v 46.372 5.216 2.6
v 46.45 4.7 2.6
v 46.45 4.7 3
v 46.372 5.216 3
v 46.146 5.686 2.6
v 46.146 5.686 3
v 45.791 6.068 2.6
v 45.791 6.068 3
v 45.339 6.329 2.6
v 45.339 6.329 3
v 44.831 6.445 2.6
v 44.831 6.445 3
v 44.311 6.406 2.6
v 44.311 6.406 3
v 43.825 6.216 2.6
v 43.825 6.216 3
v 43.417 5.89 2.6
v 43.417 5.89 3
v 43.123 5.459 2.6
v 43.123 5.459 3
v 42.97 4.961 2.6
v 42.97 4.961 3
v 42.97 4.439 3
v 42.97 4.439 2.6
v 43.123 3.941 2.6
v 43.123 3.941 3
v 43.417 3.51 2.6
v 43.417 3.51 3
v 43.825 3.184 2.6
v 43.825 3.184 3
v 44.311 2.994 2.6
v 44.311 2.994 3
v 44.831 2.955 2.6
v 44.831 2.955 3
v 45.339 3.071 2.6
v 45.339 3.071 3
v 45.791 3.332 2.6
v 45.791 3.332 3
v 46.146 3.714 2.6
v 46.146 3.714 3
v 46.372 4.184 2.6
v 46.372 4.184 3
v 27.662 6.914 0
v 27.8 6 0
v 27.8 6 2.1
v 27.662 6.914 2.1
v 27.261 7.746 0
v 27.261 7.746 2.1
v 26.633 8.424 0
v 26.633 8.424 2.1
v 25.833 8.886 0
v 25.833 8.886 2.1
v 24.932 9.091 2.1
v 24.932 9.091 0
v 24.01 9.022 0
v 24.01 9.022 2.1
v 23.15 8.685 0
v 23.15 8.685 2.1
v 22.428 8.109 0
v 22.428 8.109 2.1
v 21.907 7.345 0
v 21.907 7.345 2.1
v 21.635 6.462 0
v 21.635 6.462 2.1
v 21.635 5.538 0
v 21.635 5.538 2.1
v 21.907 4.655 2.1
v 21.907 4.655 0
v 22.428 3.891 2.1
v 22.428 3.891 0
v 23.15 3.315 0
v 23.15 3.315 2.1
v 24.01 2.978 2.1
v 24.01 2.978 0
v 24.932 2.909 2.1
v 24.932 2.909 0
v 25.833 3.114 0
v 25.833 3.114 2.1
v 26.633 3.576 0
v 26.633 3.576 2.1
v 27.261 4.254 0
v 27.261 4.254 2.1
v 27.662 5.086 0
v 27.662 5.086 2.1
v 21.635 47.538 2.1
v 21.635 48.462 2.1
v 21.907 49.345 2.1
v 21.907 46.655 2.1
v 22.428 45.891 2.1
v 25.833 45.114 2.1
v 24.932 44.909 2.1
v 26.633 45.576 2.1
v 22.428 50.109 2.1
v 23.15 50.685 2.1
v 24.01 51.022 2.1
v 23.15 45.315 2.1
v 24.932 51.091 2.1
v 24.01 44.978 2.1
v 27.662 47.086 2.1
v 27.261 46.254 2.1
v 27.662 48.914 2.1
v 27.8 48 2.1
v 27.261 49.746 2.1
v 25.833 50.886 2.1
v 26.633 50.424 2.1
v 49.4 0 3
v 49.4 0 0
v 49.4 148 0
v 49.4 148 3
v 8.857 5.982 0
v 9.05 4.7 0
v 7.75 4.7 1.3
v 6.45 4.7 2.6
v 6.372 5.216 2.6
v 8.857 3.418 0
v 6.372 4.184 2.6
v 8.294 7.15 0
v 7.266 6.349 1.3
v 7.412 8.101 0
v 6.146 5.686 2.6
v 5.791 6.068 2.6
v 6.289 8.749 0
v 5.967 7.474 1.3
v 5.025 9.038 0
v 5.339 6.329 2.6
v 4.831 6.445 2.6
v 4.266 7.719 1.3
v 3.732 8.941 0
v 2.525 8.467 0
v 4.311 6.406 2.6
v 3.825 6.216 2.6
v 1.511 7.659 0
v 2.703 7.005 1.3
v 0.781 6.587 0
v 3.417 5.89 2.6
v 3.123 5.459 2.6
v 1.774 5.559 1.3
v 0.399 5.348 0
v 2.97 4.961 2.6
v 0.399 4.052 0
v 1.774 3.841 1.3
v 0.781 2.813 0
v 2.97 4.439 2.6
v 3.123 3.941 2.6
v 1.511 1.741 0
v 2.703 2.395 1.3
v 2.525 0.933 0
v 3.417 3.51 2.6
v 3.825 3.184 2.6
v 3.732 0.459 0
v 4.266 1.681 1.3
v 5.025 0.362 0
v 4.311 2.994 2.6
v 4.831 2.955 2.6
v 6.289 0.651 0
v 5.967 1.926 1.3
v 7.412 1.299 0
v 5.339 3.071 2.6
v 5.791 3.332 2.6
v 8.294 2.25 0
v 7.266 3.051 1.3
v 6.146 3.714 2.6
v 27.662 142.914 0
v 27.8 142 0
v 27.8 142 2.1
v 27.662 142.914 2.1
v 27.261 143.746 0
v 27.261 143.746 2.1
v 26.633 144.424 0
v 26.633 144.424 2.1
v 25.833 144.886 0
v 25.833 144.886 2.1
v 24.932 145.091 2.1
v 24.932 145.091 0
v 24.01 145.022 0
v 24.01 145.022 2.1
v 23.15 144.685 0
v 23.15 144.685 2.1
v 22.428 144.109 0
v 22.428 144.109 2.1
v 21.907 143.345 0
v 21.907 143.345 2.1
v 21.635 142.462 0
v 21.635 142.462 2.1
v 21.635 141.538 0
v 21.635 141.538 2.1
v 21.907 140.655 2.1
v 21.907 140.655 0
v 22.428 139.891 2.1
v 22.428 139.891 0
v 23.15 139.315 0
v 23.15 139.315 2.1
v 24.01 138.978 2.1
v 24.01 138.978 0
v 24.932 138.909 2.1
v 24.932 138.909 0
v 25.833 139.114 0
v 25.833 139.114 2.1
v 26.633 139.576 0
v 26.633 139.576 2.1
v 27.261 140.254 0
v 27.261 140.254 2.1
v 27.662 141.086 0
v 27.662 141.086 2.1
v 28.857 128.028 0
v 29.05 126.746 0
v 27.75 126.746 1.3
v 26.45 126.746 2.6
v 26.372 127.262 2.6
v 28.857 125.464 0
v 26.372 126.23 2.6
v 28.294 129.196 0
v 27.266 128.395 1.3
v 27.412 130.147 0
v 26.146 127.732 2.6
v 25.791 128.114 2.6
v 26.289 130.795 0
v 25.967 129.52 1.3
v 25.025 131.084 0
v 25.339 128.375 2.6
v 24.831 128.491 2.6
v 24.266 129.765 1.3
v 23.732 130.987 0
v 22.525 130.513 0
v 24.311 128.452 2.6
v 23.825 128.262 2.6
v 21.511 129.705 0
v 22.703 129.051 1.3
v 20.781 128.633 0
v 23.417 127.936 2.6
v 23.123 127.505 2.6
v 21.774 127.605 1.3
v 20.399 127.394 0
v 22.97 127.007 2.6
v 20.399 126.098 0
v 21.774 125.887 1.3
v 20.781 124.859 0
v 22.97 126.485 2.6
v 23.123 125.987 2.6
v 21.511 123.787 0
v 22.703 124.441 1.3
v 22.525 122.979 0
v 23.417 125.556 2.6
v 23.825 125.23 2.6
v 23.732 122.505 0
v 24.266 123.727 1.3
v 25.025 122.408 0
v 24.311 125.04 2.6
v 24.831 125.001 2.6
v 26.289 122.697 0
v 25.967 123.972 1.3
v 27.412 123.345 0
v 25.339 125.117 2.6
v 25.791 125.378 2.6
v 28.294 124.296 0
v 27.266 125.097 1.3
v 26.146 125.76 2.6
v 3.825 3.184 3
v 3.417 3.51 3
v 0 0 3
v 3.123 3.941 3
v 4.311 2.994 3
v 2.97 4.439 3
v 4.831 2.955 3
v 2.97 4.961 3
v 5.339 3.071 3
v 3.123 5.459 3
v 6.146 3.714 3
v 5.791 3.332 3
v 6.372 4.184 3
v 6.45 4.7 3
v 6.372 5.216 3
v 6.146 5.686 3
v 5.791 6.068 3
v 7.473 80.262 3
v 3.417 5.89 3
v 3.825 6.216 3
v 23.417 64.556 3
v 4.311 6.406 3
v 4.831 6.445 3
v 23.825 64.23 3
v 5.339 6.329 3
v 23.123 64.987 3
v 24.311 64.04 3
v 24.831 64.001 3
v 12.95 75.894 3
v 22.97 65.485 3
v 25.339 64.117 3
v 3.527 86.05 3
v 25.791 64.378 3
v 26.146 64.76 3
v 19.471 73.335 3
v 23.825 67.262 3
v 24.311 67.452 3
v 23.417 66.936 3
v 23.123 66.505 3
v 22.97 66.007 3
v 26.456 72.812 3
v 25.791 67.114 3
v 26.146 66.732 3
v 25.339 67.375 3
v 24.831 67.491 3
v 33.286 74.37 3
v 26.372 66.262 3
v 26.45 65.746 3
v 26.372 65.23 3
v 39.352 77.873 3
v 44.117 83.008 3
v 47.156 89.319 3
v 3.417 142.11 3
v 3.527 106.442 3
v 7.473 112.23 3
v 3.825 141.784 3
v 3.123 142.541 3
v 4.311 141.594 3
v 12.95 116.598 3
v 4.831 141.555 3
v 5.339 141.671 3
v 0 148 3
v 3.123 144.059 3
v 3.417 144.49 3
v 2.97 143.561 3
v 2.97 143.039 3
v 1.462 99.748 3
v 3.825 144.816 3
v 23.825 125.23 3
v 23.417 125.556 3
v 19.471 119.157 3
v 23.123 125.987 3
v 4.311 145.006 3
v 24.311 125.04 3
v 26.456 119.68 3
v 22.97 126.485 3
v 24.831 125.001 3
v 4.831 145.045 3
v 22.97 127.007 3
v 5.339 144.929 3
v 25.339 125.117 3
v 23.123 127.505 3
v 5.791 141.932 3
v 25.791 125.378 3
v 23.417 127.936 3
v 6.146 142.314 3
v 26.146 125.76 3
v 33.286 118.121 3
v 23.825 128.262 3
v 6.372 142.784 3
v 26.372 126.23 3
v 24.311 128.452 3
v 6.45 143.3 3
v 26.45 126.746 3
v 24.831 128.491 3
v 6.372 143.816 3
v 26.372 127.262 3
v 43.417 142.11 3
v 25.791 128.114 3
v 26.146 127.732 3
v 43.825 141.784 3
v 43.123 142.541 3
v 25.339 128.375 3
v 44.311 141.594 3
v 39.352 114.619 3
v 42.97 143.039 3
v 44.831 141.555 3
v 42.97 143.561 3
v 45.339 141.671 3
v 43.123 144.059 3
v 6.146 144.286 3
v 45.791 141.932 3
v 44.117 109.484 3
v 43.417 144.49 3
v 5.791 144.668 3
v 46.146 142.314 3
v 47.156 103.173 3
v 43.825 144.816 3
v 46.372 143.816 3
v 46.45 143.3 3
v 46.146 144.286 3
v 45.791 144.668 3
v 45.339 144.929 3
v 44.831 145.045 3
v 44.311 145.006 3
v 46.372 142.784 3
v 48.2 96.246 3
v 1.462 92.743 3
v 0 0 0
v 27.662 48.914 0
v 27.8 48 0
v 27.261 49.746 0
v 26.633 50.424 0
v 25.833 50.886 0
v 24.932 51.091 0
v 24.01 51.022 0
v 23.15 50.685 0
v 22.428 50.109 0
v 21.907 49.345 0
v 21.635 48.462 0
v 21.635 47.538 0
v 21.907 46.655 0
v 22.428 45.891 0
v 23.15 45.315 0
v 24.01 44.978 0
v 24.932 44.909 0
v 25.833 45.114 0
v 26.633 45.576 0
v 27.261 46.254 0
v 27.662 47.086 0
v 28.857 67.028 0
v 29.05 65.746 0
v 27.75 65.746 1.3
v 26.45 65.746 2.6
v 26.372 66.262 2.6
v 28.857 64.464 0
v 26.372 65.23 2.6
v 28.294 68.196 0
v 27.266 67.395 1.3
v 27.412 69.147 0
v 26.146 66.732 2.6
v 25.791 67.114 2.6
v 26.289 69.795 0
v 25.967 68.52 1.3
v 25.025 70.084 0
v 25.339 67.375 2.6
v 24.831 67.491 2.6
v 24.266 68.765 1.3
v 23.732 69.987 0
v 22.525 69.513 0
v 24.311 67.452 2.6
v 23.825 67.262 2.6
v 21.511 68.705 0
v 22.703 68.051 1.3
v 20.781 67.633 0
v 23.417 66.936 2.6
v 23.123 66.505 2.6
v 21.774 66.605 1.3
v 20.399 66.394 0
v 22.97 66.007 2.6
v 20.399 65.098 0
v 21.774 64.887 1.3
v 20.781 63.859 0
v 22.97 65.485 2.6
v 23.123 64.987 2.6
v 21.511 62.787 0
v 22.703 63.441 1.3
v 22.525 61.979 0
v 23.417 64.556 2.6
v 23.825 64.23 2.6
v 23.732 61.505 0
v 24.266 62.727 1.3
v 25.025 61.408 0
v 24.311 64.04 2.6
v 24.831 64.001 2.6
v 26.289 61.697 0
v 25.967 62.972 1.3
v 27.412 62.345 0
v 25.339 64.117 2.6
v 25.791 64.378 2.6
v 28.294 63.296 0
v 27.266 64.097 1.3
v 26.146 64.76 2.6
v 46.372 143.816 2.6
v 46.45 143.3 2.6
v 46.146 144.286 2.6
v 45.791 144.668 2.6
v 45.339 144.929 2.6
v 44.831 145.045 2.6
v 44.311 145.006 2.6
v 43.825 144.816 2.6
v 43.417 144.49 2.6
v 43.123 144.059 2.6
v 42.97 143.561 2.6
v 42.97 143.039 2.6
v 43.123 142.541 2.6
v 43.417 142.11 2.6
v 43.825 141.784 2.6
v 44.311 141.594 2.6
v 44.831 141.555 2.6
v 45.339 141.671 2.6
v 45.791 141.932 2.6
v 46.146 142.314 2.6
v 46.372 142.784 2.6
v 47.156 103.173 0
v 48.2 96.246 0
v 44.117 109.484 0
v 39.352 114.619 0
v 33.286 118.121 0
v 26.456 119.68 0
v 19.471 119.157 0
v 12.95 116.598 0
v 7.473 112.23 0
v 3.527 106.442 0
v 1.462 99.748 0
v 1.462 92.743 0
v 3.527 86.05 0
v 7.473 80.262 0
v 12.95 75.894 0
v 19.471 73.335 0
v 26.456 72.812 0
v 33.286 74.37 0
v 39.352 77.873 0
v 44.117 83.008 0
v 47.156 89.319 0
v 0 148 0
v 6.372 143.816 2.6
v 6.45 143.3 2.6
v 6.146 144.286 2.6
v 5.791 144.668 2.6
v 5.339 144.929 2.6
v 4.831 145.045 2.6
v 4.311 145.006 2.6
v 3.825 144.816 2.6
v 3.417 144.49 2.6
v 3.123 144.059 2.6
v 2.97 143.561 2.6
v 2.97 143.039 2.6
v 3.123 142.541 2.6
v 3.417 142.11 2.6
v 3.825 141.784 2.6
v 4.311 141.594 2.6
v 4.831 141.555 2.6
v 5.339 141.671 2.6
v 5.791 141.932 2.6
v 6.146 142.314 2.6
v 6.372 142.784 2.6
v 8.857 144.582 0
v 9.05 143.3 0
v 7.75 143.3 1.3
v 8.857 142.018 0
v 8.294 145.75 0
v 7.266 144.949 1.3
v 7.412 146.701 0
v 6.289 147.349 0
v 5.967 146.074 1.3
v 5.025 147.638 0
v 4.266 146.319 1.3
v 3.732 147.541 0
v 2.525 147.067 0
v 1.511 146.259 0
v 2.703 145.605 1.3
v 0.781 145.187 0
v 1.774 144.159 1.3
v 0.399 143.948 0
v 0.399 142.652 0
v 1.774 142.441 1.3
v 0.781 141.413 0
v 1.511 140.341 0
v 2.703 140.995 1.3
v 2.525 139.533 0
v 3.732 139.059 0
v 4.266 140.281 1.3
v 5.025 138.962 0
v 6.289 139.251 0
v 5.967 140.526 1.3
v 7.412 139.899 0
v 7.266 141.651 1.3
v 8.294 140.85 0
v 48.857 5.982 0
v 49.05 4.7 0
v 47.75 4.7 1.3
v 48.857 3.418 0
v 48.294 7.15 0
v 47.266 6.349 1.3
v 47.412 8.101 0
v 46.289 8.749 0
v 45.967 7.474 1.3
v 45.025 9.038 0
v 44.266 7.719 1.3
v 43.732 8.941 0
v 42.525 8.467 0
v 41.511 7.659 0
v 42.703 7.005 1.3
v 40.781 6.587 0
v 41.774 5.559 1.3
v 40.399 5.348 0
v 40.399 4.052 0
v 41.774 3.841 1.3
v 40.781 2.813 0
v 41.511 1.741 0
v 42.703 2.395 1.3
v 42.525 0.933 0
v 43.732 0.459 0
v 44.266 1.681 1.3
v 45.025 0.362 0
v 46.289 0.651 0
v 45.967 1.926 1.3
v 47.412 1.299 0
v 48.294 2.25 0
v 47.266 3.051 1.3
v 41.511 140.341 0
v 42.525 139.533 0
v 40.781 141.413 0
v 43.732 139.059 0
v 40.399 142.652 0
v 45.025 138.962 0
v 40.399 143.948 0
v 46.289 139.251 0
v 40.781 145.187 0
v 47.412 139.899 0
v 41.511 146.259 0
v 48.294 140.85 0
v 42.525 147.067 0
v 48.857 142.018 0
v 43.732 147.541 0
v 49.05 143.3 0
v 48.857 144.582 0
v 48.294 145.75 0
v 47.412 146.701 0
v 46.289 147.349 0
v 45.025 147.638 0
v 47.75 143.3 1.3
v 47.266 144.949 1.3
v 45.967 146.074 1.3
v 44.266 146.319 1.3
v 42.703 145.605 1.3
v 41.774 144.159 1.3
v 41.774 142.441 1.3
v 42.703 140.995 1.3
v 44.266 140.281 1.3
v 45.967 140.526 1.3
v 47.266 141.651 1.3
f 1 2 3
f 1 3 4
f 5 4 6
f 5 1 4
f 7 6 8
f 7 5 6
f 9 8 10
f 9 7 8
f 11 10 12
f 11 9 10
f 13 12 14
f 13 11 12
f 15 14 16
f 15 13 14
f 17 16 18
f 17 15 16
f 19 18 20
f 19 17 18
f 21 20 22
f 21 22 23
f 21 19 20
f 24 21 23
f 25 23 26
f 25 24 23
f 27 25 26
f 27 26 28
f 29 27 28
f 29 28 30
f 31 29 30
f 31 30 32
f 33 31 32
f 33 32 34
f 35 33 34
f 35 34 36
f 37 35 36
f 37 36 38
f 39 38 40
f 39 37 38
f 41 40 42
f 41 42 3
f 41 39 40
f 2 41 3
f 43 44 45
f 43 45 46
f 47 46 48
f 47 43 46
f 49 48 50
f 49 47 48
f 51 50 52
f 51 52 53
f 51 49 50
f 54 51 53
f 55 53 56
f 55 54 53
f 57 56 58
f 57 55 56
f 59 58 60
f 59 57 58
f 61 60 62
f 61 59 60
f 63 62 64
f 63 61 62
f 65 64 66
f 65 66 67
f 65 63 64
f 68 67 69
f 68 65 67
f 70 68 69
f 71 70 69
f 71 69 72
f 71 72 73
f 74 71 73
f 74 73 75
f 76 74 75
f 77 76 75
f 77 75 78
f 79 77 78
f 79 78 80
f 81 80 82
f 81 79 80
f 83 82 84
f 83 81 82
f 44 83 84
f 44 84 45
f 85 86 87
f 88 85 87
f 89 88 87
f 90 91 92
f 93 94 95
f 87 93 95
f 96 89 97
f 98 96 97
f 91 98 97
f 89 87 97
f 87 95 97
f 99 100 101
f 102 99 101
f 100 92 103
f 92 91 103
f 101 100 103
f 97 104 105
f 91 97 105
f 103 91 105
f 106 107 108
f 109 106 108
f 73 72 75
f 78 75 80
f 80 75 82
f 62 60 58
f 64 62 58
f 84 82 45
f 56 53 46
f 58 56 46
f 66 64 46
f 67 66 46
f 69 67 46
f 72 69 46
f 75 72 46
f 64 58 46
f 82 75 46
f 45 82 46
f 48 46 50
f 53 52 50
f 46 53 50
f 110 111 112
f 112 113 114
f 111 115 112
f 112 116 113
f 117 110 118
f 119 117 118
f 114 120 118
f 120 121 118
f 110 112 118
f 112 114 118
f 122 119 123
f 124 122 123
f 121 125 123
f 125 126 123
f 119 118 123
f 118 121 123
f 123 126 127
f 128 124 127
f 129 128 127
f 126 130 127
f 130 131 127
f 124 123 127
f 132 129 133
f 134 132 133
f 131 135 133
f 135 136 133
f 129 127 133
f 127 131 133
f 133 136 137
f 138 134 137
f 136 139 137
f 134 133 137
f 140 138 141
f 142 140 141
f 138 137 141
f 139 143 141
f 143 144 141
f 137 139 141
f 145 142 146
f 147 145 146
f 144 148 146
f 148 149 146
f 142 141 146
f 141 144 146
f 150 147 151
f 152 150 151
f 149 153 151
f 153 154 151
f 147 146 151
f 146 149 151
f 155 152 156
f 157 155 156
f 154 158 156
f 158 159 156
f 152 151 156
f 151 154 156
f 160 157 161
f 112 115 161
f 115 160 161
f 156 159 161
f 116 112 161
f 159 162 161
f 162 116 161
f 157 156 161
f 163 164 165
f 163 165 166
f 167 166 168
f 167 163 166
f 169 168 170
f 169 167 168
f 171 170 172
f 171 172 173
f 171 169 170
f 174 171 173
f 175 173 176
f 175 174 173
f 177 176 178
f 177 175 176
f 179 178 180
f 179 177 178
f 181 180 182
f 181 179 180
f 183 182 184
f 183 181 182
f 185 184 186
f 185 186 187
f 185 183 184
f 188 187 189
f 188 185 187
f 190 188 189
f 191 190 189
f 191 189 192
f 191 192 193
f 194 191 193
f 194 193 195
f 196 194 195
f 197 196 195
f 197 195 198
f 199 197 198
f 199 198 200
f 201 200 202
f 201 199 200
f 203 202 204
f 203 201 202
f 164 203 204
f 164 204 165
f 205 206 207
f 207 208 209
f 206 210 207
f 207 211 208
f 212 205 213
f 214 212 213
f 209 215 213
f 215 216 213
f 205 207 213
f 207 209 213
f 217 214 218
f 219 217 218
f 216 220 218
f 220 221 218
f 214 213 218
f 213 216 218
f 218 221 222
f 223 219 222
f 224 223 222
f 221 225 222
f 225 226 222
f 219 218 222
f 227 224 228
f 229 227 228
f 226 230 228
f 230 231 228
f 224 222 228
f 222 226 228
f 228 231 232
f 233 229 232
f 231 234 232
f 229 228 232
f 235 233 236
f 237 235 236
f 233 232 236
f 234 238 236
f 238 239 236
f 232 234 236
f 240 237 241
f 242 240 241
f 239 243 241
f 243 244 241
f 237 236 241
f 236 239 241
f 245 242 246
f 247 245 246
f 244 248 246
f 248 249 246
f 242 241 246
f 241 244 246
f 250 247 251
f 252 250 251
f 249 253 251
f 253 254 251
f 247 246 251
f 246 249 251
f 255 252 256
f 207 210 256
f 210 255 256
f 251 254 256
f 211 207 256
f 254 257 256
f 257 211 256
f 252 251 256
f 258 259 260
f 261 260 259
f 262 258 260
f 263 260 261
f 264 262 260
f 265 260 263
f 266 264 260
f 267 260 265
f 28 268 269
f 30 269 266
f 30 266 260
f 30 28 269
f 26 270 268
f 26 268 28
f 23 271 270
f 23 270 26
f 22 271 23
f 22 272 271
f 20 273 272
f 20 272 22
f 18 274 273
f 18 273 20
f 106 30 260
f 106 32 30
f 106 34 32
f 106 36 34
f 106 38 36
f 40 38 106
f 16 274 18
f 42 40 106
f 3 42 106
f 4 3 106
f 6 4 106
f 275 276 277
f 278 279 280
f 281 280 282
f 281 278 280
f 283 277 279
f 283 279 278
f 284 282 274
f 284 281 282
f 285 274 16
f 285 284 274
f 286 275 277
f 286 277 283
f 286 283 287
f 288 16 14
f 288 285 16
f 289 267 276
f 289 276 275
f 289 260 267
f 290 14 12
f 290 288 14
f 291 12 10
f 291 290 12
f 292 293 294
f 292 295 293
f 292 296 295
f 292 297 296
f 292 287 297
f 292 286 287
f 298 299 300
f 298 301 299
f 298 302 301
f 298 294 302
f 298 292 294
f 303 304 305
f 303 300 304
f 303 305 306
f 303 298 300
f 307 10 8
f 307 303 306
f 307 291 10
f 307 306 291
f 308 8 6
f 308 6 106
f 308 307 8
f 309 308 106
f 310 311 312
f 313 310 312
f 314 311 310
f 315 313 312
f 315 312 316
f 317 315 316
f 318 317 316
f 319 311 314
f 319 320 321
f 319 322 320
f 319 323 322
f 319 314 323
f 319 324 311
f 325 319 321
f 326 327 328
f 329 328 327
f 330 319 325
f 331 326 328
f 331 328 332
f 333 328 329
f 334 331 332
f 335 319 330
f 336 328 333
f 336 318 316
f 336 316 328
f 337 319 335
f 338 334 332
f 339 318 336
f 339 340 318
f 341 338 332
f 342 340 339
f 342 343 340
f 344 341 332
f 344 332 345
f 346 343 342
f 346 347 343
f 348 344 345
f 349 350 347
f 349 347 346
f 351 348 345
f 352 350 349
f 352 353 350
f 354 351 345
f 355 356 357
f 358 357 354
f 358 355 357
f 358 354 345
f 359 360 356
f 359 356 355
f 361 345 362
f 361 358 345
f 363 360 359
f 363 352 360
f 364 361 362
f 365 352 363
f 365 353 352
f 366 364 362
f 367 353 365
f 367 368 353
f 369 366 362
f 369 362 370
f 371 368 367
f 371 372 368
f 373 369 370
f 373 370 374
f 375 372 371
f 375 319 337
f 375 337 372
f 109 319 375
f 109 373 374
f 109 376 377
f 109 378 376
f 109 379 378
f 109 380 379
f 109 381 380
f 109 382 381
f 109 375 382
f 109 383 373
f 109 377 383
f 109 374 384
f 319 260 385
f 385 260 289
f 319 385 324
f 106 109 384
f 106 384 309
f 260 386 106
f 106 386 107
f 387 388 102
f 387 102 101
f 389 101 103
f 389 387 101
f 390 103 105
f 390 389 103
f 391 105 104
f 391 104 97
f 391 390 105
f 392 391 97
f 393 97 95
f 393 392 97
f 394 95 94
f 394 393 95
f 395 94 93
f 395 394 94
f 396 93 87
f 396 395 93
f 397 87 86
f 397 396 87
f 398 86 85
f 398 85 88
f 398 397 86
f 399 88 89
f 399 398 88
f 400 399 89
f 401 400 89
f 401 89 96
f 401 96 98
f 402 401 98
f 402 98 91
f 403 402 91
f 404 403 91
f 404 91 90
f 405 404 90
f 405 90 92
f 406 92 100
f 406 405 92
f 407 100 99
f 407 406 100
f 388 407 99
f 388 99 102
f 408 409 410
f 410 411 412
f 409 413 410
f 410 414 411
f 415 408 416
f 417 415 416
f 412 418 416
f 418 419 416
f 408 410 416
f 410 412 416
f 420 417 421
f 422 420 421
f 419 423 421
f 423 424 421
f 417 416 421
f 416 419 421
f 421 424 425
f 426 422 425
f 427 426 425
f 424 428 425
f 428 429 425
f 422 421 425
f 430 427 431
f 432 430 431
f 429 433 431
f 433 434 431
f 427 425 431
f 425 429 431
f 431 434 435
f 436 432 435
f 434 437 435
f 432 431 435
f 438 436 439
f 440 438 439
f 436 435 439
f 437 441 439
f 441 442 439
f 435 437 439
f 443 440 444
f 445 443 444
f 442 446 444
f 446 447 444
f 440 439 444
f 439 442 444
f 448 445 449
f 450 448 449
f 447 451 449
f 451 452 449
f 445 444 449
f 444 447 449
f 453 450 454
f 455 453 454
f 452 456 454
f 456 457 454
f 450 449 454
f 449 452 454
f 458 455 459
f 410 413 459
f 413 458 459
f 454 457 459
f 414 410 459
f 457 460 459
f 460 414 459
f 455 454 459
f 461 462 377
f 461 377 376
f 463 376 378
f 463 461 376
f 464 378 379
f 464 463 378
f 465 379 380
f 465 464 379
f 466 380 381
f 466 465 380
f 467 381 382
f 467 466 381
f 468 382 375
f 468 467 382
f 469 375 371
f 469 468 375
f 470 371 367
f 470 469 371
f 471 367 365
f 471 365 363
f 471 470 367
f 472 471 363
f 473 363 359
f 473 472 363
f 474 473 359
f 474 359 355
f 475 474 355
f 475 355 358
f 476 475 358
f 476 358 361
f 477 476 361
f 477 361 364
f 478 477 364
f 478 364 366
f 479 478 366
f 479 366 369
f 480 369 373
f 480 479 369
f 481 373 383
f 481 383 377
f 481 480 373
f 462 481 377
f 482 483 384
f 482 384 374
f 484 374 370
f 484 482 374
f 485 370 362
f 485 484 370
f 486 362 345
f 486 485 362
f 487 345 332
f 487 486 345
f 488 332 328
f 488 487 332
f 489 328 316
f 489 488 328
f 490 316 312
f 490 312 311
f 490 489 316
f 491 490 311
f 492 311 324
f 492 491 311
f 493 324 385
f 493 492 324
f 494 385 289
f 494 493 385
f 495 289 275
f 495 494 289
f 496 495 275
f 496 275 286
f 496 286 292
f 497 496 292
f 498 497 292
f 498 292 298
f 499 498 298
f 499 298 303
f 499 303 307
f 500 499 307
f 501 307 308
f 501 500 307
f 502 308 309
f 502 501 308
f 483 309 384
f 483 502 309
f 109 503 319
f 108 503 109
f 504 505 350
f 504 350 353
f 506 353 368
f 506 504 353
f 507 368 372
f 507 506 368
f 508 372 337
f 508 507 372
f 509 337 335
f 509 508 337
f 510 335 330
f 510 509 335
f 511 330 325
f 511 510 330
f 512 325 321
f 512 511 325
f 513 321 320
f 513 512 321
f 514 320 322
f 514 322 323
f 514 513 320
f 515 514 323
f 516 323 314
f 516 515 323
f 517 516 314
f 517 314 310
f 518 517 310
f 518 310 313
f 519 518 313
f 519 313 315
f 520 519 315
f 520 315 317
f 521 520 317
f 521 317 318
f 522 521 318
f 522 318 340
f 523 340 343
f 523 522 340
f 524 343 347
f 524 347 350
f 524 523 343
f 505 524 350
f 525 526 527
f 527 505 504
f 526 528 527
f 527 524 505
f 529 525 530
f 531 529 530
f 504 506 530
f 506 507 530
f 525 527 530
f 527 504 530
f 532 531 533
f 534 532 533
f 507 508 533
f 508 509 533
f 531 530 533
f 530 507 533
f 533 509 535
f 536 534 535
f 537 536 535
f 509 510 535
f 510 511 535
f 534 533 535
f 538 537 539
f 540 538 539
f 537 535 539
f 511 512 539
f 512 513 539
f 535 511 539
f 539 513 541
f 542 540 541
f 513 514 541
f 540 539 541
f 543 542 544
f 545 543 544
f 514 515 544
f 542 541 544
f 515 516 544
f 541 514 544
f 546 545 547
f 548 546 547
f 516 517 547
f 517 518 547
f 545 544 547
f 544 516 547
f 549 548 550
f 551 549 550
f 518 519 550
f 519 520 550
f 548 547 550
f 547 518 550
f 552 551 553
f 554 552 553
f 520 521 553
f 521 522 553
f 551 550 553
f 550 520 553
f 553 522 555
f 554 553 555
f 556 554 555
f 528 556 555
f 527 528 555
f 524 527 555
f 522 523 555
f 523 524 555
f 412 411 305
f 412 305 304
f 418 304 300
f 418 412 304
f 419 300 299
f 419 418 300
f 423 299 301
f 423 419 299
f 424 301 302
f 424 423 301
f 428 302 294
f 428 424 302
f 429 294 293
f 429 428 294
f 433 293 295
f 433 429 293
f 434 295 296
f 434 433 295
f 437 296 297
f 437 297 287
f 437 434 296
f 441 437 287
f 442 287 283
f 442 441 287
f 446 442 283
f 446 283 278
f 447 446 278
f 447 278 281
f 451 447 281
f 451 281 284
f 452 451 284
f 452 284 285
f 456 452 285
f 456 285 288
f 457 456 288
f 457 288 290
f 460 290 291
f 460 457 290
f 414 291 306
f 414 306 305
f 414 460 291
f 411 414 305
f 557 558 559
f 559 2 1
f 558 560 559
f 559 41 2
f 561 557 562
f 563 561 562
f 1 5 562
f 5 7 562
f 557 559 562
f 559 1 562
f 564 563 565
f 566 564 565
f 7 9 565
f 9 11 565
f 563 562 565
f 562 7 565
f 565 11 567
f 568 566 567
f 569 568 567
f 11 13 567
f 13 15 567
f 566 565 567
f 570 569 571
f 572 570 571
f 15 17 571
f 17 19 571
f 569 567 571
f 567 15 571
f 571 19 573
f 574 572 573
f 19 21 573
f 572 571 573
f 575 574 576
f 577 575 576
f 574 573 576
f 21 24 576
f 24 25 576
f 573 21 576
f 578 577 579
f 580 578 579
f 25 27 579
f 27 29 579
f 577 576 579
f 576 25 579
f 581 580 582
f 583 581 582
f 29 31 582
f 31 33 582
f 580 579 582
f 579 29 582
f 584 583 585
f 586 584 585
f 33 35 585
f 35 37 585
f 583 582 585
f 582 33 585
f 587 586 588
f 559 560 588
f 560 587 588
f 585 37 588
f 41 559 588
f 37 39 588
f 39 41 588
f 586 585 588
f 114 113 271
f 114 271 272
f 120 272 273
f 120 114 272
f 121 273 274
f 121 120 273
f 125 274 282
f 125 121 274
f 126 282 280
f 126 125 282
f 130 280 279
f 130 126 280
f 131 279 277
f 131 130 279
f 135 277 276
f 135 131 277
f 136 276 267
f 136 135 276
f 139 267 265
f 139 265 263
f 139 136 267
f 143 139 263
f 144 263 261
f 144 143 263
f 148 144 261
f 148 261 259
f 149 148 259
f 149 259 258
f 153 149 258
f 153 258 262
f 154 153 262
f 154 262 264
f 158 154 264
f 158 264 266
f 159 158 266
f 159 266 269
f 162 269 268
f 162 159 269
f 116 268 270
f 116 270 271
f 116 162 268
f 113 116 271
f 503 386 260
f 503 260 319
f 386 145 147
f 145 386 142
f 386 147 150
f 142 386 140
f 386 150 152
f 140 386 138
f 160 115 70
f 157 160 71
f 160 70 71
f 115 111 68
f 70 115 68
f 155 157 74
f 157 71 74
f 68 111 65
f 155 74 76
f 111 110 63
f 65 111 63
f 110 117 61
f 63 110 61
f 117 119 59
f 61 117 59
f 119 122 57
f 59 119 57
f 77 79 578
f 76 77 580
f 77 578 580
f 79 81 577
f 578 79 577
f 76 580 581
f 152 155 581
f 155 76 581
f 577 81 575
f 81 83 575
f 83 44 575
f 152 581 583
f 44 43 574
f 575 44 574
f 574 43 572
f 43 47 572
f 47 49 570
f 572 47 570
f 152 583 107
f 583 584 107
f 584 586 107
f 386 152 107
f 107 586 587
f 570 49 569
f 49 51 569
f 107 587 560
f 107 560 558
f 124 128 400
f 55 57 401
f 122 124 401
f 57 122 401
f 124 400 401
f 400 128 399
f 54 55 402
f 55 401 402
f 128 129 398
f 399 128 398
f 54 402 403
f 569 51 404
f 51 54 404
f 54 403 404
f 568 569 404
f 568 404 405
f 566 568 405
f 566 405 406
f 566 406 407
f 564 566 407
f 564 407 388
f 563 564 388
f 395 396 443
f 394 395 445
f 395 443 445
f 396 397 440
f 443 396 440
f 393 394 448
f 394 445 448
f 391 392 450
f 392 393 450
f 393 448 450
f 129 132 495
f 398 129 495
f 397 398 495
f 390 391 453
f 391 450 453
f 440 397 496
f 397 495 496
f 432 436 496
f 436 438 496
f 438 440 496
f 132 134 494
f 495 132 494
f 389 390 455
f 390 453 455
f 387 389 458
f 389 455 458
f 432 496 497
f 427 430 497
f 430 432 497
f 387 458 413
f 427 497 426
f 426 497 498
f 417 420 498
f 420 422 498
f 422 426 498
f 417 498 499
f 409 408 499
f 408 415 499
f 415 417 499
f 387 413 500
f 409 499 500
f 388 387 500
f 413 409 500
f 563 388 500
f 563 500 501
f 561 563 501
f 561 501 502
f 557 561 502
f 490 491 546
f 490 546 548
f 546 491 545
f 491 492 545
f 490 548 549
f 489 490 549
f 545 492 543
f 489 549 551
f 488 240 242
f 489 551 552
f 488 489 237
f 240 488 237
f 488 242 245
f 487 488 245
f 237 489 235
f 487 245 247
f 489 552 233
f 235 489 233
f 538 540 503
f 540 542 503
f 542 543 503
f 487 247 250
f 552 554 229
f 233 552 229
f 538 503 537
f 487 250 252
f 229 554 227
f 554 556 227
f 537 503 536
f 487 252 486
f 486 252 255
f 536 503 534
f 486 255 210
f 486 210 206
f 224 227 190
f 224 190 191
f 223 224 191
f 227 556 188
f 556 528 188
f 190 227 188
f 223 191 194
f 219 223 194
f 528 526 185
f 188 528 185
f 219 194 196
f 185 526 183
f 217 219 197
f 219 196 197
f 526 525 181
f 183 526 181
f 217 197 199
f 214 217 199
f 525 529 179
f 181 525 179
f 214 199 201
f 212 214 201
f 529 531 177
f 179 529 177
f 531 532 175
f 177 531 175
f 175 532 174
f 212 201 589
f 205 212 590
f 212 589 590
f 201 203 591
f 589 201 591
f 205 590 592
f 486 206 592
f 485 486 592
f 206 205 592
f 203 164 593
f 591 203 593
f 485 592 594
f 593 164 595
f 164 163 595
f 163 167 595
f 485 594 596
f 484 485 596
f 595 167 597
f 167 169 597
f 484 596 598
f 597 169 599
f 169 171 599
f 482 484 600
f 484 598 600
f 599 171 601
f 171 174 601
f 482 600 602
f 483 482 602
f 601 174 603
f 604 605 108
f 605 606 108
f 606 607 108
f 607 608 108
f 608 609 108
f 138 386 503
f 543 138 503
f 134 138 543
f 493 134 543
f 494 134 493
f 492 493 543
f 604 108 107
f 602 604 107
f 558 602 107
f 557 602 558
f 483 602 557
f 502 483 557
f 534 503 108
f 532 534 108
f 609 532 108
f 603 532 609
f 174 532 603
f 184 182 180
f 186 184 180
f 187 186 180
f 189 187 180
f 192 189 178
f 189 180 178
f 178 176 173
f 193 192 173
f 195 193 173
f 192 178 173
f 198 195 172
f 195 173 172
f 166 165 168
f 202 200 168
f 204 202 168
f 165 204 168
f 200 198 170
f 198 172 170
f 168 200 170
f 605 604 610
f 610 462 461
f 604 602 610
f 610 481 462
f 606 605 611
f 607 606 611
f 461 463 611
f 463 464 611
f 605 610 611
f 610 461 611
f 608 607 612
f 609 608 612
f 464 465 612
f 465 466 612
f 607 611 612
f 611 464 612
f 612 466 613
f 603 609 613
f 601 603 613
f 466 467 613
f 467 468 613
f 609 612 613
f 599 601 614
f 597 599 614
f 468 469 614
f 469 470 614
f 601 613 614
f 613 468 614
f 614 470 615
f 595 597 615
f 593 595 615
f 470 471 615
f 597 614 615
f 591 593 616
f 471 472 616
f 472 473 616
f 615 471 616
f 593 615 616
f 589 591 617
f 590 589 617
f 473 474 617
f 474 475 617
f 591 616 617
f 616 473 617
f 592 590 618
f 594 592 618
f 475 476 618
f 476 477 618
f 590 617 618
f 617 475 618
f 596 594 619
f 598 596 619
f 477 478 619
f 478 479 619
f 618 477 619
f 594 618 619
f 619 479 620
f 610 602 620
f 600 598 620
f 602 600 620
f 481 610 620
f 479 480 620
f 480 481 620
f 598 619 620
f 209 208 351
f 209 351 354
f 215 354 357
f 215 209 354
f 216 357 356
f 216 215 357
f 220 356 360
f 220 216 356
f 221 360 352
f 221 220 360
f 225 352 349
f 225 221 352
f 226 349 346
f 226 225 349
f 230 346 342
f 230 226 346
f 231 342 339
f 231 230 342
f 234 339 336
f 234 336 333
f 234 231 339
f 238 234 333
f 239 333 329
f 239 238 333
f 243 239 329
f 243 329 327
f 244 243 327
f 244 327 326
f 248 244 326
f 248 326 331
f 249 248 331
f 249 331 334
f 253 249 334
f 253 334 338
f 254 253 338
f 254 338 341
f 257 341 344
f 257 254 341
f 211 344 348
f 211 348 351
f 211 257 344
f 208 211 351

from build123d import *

# Parameters (mm, degrees)
SKETCH_W     = 49.4
SKETCH_H     = 148
SKETCH_R     = 1.75
SKETCH_R_2   = 23.5
PAD_DEPTH    = 3
SKETCH001_R  = 3.1
POCKET_DEPTH = 2.1
CHAMFER_SIZE = 2.6


with BuildPart() as part:
    # Sketch → Pad (new body)
    with BuildSketch(Plane.XY):
        with Locations((24.7, 74)):
            Rectangle(SKETCH_W, SKETCH_H)
        with Locations((24.7, 126.745966)):
            Circle(SKETCH_R, mode=Mode.SUBTRACT)
        with Locations((24.7, 65.745966)):
            Circle(SKETCH_R, mode=Mode.SUBTRACT)
        with Locations((24.7, 96.245966)):
            Circle(SKETCH_R_2, mode=Mode.SUBTRACT)
        with Locations((4.7, 143.3)):
            Circle(SKETCH_R, mode=Mode.SUBTRACT)
        with Locations((44.7, 143.3)):
            Circle(SKETCH_R, mode=Mode.SUBTRACT)
        with Locations((4.7, 4.7)):
            Circle(SKETCH_R, mode=Mode.SUBTRACT)
        with Locations((44.7, 4.7)):
            Circle(SKETCH_R, mode=Mode.SUBTRACT)
    extrude(amount=PAD_DEPTH)

    # Sketch001 → Pocket (cut)
    with BuildSketch(Plane.XY):
        with Locations((24.7, 142)):
            Circle(SKETCH001_R)
        with Locations((24.7, 48)):
            Circle(SKETCH001_R)
        with Locations((24.7, 6)):
            Circle(SKETCH001_R)
    extrude(amount=POCKET_DEPTH, mode=Mode.SUBTRACT)

    # Chamfer
    chamfer_edges = [part.edges().sort_by_distance(p)[0] for p in [
        (42.95, 143.3, 0),
        (2.95, 143.3, 0),
        (2.95, 4.7, 0),
        (22.95, 65.745966, 0),
        (22.95, 126.745966, 0),
        (42.95, 4.7, 0),
    ]]
    chamfer(chamfer_edges, length=CHAMFER_SIZE)


solid = part.part
